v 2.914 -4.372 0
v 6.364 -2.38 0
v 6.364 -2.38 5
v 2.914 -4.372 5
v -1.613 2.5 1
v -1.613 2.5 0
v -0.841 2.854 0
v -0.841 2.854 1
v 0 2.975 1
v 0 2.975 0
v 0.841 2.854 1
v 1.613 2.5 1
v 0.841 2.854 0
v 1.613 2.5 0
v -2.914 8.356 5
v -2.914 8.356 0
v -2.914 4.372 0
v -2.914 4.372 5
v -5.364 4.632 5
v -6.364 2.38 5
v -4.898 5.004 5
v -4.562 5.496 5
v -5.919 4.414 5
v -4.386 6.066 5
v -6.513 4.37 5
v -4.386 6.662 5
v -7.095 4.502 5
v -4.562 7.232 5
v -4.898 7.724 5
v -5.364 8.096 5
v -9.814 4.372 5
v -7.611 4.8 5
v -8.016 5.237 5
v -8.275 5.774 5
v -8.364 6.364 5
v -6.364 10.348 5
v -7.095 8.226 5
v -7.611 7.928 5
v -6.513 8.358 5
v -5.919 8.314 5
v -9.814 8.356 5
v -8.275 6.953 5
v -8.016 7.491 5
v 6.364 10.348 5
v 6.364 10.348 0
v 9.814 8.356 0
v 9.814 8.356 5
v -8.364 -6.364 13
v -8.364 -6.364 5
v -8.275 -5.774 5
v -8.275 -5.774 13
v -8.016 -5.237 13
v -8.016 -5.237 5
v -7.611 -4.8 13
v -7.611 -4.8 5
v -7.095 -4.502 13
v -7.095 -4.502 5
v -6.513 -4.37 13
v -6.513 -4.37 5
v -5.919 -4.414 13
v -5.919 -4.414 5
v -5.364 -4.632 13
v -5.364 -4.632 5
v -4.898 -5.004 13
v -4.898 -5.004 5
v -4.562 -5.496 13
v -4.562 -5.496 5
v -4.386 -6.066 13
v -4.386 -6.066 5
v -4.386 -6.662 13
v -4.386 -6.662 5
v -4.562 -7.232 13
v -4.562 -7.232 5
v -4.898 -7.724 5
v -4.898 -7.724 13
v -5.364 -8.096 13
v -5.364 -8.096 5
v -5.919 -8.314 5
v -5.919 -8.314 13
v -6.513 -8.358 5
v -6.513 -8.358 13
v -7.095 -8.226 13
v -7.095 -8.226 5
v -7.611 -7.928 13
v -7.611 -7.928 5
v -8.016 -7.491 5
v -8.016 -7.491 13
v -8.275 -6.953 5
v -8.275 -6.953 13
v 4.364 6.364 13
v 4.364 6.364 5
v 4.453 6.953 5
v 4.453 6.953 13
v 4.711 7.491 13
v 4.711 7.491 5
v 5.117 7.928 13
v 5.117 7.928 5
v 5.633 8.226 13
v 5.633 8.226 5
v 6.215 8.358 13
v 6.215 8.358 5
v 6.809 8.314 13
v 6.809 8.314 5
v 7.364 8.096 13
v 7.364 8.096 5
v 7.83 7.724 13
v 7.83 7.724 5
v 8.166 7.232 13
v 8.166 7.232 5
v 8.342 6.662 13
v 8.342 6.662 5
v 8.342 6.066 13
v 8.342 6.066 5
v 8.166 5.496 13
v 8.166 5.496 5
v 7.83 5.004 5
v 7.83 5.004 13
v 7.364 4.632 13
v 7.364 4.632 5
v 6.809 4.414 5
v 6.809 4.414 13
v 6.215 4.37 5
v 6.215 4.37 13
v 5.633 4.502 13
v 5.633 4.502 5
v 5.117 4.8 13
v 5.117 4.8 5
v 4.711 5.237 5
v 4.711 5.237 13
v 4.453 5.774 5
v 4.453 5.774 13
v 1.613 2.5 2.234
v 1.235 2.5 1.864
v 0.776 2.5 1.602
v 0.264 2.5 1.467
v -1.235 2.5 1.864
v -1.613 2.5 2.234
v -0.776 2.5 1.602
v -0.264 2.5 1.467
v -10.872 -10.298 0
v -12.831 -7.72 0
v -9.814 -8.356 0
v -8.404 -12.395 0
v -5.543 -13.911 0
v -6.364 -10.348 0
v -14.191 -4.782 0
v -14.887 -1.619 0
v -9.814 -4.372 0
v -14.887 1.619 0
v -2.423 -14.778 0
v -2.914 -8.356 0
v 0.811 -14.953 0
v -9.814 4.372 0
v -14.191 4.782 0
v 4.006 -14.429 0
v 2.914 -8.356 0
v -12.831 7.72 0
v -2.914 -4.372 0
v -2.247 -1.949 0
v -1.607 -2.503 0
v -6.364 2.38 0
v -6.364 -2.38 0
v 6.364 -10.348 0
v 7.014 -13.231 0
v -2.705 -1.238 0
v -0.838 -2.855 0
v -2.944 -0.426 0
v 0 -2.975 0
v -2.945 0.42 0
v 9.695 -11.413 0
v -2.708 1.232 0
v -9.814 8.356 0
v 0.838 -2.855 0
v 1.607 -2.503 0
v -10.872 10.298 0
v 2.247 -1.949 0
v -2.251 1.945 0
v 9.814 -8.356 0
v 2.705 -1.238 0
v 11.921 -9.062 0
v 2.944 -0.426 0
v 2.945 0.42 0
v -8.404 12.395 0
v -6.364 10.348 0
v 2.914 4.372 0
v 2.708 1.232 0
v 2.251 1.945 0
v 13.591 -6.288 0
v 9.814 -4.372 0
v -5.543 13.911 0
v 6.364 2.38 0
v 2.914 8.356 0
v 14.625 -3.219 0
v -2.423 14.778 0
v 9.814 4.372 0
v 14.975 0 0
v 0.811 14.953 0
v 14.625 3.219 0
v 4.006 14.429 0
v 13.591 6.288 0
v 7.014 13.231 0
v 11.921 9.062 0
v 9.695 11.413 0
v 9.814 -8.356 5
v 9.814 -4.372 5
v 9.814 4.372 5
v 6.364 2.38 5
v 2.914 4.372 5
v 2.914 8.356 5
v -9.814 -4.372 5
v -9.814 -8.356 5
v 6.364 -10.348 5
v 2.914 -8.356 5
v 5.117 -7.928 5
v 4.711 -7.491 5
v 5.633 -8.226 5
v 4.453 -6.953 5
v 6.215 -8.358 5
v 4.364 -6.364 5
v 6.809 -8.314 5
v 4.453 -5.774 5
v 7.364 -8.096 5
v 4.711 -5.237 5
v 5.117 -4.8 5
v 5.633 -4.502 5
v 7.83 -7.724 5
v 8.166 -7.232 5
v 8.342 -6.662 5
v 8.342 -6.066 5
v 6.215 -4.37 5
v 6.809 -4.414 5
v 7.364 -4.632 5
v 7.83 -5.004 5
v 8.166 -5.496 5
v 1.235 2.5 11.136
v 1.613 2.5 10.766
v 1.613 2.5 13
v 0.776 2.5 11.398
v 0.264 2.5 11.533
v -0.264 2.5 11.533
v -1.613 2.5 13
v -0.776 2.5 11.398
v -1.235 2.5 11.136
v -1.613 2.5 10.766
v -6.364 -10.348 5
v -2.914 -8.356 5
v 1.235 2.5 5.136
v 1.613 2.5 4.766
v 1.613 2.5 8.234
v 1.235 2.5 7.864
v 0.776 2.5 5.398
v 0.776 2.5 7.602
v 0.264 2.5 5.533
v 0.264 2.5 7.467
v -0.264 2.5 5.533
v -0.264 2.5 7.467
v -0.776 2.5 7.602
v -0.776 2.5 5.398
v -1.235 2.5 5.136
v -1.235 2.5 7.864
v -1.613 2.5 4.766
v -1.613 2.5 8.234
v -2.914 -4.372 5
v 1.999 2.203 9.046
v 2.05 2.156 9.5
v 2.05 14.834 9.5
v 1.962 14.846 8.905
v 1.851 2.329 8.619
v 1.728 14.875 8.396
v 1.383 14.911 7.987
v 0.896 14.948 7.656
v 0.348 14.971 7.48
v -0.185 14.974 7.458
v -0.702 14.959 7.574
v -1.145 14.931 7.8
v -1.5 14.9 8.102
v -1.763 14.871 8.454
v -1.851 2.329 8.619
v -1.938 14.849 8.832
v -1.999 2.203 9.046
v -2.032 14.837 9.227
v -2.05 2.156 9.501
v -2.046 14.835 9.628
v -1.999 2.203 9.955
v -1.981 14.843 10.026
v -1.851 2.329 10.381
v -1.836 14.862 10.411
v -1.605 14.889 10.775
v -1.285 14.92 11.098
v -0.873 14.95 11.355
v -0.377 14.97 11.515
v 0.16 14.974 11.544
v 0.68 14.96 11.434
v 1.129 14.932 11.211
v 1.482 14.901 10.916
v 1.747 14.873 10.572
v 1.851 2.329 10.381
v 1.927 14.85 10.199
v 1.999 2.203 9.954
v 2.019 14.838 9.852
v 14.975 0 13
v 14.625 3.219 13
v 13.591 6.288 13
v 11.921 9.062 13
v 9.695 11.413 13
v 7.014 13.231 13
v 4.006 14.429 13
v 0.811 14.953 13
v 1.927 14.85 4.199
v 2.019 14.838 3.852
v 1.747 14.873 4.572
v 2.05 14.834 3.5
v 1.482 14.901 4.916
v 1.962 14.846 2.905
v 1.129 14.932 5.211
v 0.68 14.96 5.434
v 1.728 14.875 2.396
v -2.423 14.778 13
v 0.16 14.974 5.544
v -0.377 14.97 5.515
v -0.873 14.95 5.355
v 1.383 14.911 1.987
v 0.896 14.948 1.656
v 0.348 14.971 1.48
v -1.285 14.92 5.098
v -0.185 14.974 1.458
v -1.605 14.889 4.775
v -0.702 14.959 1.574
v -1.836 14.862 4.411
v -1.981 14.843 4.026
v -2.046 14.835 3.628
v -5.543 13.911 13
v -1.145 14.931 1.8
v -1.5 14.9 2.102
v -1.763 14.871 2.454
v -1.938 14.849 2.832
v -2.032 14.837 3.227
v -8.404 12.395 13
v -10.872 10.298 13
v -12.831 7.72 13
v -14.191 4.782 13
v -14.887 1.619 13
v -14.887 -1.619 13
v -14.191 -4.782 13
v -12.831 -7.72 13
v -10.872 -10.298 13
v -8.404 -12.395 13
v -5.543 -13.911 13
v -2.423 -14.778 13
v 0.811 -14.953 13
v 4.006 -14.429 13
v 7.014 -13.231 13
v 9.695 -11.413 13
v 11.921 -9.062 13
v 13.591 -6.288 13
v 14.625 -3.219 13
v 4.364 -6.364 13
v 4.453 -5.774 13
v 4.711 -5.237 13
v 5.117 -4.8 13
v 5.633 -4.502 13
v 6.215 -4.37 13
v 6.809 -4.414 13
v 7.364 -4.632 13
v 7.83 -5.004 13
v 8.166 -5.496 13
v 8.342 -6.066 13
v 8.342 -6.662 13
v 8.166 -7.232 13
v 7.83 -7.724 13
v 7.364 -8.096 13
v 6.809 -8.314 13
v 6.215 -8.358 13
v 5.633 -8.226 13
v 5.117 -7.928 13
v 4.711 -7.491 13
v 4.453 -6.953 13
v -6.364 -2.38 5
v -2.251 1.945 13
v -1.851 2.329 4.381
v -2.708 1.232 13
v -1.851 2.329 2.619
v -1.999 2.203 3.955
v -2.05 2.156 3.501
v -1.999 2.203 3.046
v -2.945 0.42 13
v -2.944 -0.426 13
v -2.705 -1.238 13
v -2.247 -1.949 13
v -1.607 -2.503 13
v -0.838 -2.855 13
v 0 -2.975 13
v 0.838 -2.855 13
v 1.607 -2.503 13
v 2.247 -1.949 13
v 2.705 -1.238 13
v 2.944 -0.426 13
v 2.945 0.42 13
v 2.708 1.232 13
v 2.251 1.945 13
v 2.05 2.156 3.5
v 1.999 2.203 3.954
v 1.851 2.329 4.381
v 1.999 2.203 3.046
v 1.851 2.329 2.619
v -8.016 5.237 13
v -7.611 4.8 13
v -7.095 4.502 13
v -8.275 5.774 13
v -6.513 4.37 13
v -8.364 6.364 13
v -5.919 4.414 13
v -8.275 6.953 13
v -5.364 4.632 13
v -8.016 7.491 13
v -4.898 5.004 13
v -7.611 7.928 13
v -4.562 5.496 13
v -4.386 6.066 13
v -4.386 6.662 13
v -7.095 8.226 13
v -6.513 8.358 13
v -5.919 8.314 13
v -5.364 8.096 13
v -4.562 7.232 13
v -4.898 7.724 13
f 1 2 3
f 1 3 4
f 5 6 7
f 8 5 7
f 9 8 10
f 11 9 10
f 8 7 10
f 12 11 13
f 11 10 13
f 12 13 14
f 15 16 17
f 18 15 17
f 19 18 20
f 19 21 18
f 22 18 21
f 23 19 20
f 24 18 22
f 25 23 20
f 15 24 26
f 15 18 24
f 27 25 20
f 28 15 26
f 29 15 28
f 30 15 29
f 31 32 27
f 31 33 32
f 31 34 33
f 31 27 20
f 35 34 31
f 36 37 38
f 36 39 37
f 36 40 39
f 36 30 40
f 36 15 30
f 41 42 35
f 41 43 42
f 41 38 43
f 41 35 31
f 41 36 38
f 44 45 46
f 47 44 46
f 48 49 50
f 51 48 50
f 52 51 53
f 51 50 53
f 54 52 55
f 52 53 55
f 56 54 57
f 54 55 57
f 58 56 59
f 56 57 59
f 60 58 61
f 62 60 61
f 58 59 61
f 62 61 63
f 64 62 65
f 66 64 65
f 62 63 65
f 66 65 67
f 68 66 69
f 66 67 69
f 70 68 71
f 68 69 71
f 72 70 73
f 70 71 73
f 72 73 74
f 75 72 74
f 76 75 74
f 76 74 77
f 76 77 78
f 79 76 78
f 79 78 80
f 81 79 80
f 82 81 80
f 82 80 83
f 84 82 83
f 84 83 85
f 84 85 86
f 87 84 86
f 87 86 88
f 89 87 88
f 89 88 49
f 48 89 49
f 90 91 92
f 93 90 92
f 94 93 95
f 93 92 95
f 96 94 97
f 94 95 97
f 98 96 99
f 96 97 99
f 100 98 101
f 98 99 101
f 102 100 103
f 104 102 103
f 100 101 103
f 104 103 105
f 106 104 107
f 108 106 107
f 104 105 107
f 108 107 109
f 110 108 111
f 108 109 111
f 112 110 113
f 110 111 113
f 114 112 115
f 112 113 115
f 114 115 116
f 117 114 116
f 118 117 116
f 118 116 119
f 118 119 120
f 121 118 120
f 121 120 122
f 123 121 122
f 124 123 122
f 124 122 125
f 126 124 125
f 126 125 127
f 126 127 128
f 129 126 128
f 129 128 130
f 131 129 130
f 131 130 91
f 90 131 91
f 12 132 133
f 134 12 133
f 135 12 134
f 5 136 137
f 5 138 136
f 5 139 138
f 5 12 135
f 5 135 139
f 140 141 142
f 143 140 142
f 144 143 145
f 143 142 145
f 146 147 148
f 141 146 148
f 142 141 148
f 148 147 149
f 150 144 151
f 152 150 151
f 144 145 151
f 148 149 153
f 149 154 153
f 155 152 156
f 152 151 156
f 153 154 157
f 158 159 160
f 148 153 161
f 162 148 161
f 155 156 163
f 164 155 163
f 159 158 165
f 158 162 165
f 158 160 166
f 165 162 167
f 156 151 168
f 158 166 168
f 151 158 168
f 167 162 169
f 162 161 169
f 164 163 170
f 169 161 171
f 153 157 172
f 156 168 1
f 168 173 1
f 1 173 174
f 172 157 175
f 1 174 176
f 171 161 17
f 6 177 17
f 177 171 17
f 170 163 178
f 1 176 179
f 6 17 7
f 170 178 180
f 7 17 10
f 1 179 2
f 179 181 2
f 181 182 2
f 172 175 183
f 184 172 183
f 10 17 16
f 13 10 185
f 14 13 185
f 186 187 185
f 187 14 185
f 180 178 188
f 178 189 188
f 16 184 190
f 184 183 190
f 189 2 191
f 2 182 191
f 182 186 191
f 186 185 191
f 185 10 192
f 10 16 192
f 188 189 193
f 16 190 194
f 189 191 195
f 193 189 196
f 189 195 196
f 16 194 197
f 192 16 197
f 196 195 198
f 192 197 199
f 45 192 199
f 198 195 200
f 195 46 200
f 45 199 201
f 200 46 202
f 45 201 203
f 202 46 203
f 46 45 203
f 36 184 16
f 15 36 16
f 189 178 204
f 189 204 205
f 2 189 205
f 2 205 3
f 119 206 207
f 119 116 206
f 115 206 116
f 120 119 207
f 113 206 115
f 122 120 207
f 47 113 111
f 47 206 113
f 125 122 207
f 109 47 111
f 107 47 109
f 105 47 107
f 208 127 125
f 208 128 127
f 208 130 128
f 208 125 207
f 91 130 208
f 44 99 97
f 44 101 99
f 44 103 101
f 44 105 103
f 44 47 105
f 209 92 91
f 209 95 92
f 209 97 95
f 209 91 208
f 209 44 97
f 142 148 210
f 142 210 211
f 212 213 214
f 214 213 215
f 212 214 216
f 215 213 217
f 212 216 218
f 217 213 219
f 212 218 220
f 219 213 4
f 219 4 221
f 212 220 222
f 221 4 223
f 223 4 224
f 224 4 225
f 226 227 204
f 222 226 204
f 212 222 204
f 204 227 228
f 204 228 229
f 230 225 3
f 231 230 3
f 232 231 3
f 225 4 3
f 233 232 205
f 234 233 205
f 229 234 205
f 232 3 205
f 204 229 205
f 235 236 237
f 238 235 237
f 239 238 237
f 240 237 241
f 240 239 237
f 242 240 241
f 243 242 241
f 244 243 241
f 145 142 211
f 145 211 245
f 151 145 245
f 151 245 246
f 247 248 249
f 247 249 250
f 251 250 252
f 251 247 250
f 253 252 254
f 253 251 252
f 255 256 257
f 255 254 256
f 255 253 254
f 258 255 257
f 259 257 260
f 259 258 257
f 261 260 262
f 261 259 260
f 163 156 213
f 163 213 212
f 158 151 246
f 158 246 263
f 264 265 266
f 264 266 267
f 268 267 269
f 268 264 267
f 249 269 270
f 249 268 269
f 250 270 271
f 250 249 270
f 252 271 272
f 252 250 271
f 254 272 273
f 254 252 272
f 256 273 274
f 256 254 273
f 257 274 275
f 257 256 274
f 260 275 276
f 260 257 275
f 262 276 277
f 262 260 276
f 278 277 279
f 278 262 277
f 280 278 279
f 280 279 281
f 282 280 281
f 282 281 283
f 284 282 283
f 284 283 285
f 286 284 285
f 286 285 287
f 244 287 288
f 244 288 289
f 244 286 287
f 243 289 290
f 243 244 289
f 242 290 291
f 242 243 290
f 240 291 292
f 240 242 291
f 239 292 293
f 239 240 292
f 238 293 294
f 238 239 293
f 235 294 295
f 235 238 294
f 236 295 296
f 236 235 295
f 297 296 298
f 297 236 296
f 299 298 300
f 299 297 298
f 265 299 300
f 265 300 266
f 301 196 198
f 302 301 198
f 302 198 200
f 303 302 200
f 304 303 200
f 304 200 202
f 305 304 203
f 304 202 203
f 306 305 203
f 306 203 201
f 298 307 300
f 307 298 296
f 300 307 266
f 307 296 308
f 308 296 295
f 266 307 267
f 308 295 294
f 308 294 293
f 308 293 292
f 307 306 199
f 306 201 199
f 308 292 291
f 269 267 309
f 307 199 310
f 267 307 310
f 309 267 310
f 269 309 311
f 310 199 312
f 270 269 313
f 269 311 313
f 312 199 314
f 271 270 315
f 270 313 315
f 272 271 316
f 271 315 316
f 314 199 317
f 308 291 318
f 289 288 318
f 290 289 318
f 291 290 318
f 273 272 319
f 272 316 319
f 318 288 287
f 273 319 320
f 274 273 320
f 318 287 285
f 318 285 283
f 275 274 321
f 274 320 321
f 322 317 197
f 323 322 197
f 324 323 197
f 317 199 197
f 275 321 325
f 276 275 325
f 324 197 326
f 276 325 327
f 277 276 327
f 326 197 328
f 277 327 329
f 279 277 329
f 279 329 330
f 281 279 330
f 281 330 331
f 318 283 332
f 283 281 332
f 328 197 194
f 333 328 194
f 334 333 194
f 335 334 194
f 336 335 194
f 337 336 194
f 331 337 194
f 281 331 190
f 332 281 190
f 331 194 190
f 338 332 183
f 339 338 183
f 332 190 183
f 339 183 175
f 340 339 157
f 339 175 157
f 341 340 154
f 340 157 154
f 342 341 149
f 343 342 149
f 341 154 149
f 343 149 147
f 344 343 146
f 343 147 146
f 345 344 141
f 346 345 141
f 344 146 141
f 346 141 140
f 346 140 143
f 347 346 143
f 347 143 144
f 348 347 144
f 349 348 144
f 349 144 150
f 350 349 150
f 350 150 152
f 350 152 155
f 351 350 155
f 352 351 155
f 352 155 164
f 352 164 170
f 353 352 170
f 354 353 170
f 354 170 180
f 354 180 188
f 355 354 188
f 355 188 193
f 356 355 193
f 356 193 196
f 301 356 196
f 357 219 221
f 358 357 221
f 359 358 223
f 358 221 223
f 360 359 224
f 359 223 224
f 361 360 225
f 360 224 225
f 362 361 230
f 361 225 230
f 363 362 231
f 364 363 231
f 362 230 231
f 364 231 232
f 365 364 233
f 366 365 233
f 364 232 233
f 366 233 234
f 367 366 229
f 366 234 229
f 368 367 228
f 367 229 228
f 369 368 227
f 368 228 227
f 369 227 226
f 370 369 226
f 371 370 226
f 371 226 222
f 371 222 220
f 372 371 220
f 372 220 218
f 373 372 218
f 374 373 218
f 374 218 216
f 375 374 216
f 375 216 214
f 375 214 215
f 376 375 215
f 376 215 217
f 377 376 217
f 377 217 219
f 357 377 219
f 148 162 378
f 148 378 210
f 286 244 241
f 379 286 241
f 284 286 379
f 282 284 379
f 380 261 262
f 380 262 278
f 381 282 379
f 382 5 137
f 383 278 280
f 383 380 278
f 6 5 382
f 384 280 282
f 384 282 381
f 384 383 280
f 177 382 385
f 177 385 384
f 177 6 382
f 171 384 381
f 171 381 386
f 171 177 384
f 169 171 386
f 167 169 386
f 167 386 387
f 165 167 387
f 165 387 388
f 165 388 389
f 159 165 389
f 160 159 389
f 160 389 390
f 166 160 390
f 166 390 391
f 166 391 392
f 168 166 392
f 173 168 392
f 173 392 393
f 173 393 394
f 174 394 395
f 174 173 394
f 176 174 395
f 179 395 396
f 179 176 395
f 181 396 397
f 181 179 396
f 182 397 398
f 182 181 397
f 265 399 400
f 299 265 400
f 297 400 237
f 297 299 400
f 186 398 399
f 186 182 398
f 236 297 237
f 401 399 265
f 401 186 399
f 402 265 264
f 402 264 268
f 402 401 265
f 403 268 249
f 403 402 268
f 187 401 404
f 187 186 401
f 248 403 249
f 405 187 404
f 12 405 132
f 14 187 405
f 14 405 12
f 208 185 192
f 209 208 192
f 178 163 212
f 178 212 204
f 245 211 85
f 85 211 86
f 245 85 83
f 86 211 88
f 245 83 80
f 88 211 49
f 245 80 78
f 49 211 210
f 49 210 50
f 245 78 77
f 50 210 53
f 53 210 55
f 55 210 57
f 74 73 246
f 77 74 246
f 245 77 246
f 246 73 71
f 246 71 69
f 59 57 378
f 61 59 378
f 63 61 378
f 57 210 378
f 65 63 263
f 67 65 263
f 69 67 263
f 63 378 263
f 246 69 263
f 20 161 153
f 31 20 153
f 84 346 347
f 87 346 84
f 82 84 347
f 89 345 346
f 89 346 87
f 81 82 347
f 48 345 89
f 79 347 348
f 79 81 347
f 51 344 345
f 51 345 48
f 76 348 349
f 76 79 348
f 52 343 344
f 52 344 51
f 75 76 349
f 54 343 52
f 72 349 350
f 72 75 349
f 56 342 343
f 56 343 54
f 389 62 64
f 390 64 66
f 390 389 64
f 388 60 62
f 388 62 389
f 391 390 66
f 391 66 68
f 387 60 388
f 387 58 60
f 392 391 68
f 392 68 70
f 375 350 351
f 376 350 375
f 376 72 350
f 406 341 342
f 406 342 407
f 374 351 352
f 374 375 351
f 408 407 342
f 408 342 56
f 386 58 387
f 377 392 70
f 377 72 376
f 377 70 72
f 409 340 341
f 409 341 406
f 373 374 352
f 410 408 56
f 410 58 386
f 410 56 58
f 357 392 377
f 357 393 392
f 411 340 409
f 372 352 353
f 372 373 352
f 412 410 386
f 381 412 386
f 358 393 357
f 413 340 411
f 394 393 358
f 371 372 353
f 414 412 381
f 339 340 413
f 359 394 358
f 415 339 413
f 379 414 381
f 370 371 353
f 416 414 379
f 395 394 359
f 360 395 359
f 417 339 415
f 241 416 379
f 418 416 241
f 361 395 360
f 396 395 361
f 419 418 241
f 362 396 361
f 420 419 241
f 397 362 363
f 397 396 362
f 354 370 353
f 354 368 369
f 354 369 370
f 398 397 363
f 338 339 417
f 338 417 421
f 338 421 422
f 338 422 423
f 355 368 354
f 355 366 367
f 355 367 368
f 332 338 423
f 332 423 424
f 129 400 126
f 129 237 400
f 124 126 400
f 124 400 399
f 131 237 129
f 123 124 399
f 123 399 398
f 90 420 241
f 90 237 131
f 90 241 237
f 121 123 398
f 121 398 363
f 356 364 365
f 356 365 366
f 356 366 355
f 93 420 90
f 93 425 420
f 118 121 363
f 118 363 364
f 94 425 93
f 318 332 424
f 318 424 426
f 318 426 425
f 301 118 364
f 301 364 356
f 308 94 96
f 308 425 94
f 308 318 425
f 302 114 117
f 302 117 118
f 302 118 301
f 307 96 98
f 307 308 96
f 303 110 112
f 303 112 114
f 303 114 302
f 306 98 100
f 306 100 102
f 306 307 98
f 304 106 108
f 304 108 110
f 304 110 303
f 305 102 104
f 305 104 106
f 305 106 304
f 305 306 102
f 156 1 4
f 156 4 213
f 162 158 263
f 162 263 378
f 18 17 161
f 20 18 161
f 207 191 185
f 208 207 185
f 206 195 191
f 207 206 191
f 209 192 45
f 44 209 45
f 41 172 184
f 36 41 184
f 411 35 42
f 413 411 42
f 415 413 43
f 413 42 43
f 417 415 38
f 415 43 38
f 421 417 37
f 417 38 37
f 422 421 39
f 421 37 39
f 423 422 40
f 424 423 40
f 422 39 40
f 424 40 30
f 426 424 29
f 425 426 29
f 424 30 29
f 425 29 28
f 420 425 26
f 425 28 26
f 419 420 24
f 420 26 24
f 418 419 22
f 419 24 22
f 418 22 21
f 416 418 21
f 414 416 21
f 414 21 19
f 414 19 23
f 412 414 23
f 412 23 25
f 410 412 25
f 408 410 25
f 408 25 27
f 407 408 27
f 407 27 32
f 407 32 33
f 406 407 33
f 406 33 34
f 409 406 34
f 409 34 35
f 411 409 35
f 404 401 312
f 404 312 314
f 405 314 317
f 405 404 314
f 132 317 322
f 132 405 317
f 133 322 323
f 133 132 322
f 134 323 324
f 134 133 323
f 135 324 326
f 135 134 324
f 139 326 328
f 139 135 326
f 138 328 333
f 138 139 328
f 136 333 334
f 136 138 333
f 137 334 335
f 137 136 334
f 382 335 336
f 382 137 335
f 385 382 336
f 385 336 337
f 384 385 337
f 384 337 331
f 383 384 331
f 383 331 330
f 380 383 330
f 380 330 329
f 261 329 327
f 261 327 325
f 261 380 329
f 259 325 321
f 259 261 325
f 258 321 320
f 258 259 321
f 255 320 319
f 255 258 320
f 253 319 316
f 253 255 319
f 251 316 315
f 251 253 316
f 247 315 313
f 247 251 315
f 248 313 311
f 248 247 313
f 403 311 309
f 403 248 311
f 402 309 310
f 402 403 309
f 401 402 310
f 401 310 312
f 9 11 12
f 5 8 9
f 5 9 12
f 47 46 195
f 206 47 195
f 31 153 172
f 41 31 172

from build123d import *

# Parameters (mm, degrees)
SKETCH1_R           = 14.975
BOSS_EXTRUDE1_DEPTH = 13
SKETCH3_R           = 2.05
CUT_EXTRUDE2_DEPTH  = 16
CUT_EXTRUDE7_DEPTH  = 5
SKETCH12_R          = 2
CUT_EXTRUDE8_DEPTH  = 9.0000001
SKETCH13_R          = 2.975
CUT_EXTRUDE9_DEPTH  = 1


with BuildPart() as part:
    # Sketch1 → Boss-Extrude1 (new body)
    with BuildSketch(Plane.XY):
        Circle(SKETCH1_R)
        with BuildLine():
            Line((1.612645342, 2.5), (-1.612645342, 2.5))
            ThreePointArc((-1.612645342, 2.5), (0, -2.975), (1.612645342, 2.5))
        make_face(mode=Mode.SUBTRACT)
    extrude(amount=BOSS_EXTRUDE1_DEPTH)

    # Sketch3 → Cut-Extrude2 (cut)
    with BuildSketch(Plane(origin=(0, 0, 0), x_dir=(1, 0, 0), z_dir=(0, 1, 0))):
        with Locations((0, -3.5)):
            Circle(SKETCH3_R)
        with Locations((0, -9.5)):
            Circle(SKETCH3_R)
    extrude(amount=CUT_EXTRUDE2_DEPTH, mode=Mode.SUBTRACT)

    # Sketch11 → Cut-Extrude7 (cut)
    with BuildSketch(Plane(origin=(0, 0, 0), x_dir=(-1, 0, 0), z_dir=(0, 0, -1))):
        Polygon((-6.363961031, 2.380244173), (-2.913961031, 4.372102602), (-2.913961031, 8.355819459), (-6.363961031, 10.347677888), (-9.813961031, 8.355819459), (-9.813961031, 4.372102602), align=None)
        Polygon((9.813961031, 8.355819459), (6.363961031, 10.347677888), (2.913961031, 8.355819459), (2.913961031, 4.372102602), (6.363961031, 2.380244173), (9.813961031, 4.372102602), align=None)
        Polygon((9.813961031, -4.372102602), (9.813961031, -8.355819459), (6.363961031, -10.347677888), (2.913961031, -8.355819459), (2.913961031, -4.372102602), (6.363961031, -2.380244173), align=None)
        Polygon((-9.813961031, -4.372102602), (-6.363961031, -2.380244173), (-2.913961031, -4.372102602), (-2.913961031, -8.355819459), (-6.363961031, -10.347677888), (-9.813961031, -8.355819459), align=None)
    extrude(amount=-CUT_EXTRUDE7_DEPTH, mode=Mode.SUBTRACT)

    # Sketch12 → Cut-Extrude8 (cut, through all)
    with BuildSketch(Plane(origin=(0, 0, 5), x_dir=(-1, 0, 0), z_dir=(0, 0, -1))):
        with Locations((-6.363961031, 6.363961031)):
            Circle(SKETCH12_R)
        with Locations((6.363961031, 6.363961031)):
            Circle(SKETCH12_R)
        with Locations((6.363961031, -6.363961031)):
            Circle(SKETCH12_R)
        with Locations((-6.363961031, -6.363961031)):
            Circle(SKETCH12_R)
    extrude(amount=-CUT_EXTRUDE8_DEPTH, mode=Mode.SUBTRACT)

    # Sketch13 → Cut-Extrude9 (cut)
    with BuildSketch(Plane(origin=(0, 0, 0), x_dir=(-1, 0, 0), z_dir=(0, 0, -1))):
        Circle(SKETCH13_R)
    extrude(amount=-CUT_EXTRUDE9_DEPTH, mode=Mode.SUBTRACT)


solid = part.part
